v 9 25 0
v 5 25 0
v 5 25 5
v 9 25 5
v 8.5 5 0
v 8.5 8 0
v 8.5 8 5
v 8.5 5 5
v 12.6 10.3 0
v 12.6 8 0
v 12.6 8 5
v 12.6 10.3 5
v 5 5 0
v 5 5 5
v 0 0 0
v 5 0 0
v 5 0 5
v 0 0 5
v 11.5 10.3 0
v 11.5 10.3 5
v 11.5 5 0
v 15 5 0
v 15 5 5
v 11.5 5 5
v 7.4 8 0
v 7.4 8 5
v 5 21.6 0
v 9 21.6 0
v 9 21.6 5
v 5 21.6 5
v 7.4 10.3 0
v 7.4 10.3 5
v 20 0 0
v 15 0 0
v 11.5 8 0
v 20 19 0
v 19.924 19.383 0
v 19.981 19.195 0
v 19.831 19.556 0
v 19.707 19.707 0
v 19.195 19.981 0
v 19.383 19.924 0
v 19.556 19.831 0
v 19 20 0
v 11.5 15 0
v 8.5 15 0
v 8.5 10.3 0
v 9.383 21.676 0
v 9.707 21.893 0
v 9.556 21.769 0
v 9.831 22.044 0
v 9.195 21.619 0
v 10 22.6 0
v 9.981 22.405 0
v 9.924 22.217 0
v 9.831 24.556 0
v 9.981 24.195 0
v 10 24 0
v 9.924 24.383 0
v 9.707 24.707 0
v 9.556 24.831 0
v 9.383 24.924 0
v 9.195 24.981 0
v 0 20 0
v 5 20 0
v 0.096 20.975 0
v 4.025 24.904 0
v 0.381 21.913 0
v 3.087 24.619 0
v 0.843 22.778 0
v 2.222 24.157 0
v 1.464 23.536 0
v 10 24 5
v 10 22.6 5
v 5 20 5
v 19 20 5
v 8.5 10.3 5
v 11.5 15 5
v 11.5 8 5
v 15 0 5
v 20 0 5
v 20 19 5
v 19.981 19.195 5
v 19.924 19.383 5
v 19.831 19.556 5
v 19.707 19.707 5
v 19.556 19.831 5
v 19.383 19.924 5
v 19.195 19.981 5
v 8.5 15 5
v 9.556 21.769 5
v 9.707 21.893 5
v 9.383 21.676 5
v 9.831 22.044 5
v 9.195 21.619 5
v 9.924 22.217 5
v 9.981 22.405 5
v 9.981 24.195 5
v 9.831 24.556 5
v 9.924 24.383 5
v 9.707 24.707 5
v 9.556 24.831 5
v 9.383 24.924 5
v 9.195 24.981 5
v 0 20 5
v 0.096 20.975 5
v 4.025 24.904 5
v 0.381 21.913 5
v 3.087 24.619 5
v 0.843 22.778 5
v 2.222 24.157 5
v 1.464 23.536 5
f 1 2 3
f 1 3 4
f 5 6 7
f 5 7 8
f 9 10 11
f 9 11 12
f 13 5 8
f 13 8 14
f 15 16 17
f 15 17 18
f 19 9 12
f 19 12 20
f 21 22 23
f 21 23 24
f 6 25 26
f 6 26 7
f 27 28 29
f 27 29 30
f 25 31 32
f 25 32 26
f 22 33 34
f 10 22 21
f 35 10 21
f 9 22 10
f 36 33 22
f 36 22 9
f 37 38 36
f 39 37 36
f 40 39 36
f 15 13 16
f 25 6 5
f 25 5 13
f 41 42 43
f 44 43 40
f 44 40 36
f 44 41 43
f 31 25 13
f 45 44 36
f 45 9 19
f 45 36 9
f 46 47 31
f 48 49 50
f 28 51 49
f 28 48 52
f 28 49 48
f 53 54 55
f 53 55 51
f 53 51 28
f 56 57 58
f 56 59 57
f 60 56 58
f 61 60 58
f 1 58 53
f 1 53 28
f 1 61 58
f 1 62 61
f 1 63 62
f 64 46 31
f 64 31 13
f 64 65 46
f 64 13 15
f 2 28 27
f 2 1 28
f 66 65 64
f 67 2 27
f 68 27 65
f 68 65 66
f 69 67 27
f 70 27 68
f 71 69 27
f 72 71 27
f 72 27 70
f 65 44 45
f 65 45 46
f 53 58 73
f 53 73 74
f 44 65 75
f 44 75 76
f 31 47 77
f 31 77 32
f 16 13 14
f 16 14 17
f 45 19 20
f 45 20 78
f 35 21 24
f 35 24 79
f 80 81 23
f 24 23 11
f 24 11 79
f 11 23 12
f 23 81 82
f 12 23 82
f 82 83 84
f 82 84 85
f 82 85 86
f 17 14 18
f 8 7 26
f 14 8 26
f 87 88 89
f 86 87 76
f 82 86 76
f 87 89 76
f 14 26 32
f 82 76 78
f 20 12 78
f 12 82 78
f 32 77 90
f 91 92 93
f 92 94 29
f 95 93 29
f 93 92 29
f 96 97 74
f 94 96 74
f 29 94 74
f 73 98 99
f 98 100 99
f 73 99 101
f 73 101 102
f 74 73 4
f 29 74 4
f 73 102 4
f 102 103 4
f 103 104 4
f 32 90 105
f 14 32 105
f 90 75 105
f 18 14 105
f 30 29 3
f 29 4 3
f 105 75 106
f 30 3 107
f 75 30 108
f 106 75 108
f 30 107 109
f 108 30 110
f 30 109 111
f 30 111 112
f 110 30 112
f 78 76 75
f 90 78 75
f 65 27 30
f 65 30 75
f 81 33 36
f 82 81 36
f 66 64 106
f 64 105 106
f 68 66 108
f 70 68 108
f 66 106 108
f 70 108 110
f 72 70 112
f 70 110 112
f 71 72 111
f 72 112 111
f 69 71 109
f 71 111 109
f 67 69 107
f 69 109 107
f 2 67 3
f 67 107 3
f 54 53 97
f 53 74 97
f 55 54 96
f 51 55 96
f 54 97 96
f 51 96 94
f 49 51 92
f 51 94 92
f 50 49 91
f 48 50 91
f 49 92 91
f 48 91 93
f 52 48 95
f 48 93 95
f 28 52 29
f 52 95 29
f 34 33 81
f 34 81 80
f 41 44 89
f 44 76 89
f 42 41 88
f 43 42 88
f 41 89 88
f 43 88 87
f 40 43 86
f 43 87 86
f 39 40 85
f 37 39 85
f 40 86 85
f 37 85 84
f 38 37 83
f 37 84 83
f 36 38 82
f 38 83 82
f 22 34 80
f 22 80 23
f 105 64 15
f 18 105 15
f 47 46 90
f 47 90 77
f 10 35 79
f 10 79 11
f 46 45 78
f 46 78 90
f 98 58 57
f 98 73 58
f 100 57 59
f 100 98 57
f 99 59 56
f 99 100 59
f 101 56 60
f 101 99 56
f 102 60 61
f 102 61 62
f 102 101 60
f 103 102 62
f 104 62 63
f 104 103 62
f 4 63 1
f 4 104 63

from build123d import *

# Parameters (mm, degrees)
BOSS_EXTRUDE1_DEPTH = 5
FILLET1_R           = 5
FILLET3_R           = 1
FILLET4_R           = 1


with BuildPart() as part:
    # Sketch1 → Boss-Extrude1 (new body)
    with BuildSketch(Plane.XY):
        Polygon((0, 5), (0, 19.982808697), (0, 25), (10, 25), (10, 21.6), (5, 21.6), (5, 20), (20, 20), (20, 5), (20, 0), (15, 0), (15, 5), (11.5, 5), (11.5, 8), (12.6, 8), (12.6, 10.3), (11.5, 10.3), (11.5, 15), (8.5, 15), (8.5, 10.3), (7.4, 10.3), (7.4, 8), (8.5, 8), (8.5, 5), (5, 5), (5, 0), (0, 0), align=None)
    extrude(amount=BOSS_EXTRUDE1_DEPTH)

    # Fillet1
    fillet1_edges = [part.edges().sort_by_distance(p)[0] for p in [
        (0, 25, 2.5),
    ]]
    fillet(fillet1_edges, radius=FILLET1_R)

    # Fillet3
    fillet3_edges = [part.edges().sort_by_distance(p)[0] for p in [
        (10, 21.6, 2.5),
        (20, 20, 2.5),
    ]]
    fillet(fillet3_edges, radius=FILLET3_R)

    # Fillet4
    fillet4_edges = [part.edges().sort_by_distance(p)[0] for p in [
        (10, 25, 2.5),
    ]]
    fillet(fillet4_edges, radius=FILLET4_R)


solid = part.part
